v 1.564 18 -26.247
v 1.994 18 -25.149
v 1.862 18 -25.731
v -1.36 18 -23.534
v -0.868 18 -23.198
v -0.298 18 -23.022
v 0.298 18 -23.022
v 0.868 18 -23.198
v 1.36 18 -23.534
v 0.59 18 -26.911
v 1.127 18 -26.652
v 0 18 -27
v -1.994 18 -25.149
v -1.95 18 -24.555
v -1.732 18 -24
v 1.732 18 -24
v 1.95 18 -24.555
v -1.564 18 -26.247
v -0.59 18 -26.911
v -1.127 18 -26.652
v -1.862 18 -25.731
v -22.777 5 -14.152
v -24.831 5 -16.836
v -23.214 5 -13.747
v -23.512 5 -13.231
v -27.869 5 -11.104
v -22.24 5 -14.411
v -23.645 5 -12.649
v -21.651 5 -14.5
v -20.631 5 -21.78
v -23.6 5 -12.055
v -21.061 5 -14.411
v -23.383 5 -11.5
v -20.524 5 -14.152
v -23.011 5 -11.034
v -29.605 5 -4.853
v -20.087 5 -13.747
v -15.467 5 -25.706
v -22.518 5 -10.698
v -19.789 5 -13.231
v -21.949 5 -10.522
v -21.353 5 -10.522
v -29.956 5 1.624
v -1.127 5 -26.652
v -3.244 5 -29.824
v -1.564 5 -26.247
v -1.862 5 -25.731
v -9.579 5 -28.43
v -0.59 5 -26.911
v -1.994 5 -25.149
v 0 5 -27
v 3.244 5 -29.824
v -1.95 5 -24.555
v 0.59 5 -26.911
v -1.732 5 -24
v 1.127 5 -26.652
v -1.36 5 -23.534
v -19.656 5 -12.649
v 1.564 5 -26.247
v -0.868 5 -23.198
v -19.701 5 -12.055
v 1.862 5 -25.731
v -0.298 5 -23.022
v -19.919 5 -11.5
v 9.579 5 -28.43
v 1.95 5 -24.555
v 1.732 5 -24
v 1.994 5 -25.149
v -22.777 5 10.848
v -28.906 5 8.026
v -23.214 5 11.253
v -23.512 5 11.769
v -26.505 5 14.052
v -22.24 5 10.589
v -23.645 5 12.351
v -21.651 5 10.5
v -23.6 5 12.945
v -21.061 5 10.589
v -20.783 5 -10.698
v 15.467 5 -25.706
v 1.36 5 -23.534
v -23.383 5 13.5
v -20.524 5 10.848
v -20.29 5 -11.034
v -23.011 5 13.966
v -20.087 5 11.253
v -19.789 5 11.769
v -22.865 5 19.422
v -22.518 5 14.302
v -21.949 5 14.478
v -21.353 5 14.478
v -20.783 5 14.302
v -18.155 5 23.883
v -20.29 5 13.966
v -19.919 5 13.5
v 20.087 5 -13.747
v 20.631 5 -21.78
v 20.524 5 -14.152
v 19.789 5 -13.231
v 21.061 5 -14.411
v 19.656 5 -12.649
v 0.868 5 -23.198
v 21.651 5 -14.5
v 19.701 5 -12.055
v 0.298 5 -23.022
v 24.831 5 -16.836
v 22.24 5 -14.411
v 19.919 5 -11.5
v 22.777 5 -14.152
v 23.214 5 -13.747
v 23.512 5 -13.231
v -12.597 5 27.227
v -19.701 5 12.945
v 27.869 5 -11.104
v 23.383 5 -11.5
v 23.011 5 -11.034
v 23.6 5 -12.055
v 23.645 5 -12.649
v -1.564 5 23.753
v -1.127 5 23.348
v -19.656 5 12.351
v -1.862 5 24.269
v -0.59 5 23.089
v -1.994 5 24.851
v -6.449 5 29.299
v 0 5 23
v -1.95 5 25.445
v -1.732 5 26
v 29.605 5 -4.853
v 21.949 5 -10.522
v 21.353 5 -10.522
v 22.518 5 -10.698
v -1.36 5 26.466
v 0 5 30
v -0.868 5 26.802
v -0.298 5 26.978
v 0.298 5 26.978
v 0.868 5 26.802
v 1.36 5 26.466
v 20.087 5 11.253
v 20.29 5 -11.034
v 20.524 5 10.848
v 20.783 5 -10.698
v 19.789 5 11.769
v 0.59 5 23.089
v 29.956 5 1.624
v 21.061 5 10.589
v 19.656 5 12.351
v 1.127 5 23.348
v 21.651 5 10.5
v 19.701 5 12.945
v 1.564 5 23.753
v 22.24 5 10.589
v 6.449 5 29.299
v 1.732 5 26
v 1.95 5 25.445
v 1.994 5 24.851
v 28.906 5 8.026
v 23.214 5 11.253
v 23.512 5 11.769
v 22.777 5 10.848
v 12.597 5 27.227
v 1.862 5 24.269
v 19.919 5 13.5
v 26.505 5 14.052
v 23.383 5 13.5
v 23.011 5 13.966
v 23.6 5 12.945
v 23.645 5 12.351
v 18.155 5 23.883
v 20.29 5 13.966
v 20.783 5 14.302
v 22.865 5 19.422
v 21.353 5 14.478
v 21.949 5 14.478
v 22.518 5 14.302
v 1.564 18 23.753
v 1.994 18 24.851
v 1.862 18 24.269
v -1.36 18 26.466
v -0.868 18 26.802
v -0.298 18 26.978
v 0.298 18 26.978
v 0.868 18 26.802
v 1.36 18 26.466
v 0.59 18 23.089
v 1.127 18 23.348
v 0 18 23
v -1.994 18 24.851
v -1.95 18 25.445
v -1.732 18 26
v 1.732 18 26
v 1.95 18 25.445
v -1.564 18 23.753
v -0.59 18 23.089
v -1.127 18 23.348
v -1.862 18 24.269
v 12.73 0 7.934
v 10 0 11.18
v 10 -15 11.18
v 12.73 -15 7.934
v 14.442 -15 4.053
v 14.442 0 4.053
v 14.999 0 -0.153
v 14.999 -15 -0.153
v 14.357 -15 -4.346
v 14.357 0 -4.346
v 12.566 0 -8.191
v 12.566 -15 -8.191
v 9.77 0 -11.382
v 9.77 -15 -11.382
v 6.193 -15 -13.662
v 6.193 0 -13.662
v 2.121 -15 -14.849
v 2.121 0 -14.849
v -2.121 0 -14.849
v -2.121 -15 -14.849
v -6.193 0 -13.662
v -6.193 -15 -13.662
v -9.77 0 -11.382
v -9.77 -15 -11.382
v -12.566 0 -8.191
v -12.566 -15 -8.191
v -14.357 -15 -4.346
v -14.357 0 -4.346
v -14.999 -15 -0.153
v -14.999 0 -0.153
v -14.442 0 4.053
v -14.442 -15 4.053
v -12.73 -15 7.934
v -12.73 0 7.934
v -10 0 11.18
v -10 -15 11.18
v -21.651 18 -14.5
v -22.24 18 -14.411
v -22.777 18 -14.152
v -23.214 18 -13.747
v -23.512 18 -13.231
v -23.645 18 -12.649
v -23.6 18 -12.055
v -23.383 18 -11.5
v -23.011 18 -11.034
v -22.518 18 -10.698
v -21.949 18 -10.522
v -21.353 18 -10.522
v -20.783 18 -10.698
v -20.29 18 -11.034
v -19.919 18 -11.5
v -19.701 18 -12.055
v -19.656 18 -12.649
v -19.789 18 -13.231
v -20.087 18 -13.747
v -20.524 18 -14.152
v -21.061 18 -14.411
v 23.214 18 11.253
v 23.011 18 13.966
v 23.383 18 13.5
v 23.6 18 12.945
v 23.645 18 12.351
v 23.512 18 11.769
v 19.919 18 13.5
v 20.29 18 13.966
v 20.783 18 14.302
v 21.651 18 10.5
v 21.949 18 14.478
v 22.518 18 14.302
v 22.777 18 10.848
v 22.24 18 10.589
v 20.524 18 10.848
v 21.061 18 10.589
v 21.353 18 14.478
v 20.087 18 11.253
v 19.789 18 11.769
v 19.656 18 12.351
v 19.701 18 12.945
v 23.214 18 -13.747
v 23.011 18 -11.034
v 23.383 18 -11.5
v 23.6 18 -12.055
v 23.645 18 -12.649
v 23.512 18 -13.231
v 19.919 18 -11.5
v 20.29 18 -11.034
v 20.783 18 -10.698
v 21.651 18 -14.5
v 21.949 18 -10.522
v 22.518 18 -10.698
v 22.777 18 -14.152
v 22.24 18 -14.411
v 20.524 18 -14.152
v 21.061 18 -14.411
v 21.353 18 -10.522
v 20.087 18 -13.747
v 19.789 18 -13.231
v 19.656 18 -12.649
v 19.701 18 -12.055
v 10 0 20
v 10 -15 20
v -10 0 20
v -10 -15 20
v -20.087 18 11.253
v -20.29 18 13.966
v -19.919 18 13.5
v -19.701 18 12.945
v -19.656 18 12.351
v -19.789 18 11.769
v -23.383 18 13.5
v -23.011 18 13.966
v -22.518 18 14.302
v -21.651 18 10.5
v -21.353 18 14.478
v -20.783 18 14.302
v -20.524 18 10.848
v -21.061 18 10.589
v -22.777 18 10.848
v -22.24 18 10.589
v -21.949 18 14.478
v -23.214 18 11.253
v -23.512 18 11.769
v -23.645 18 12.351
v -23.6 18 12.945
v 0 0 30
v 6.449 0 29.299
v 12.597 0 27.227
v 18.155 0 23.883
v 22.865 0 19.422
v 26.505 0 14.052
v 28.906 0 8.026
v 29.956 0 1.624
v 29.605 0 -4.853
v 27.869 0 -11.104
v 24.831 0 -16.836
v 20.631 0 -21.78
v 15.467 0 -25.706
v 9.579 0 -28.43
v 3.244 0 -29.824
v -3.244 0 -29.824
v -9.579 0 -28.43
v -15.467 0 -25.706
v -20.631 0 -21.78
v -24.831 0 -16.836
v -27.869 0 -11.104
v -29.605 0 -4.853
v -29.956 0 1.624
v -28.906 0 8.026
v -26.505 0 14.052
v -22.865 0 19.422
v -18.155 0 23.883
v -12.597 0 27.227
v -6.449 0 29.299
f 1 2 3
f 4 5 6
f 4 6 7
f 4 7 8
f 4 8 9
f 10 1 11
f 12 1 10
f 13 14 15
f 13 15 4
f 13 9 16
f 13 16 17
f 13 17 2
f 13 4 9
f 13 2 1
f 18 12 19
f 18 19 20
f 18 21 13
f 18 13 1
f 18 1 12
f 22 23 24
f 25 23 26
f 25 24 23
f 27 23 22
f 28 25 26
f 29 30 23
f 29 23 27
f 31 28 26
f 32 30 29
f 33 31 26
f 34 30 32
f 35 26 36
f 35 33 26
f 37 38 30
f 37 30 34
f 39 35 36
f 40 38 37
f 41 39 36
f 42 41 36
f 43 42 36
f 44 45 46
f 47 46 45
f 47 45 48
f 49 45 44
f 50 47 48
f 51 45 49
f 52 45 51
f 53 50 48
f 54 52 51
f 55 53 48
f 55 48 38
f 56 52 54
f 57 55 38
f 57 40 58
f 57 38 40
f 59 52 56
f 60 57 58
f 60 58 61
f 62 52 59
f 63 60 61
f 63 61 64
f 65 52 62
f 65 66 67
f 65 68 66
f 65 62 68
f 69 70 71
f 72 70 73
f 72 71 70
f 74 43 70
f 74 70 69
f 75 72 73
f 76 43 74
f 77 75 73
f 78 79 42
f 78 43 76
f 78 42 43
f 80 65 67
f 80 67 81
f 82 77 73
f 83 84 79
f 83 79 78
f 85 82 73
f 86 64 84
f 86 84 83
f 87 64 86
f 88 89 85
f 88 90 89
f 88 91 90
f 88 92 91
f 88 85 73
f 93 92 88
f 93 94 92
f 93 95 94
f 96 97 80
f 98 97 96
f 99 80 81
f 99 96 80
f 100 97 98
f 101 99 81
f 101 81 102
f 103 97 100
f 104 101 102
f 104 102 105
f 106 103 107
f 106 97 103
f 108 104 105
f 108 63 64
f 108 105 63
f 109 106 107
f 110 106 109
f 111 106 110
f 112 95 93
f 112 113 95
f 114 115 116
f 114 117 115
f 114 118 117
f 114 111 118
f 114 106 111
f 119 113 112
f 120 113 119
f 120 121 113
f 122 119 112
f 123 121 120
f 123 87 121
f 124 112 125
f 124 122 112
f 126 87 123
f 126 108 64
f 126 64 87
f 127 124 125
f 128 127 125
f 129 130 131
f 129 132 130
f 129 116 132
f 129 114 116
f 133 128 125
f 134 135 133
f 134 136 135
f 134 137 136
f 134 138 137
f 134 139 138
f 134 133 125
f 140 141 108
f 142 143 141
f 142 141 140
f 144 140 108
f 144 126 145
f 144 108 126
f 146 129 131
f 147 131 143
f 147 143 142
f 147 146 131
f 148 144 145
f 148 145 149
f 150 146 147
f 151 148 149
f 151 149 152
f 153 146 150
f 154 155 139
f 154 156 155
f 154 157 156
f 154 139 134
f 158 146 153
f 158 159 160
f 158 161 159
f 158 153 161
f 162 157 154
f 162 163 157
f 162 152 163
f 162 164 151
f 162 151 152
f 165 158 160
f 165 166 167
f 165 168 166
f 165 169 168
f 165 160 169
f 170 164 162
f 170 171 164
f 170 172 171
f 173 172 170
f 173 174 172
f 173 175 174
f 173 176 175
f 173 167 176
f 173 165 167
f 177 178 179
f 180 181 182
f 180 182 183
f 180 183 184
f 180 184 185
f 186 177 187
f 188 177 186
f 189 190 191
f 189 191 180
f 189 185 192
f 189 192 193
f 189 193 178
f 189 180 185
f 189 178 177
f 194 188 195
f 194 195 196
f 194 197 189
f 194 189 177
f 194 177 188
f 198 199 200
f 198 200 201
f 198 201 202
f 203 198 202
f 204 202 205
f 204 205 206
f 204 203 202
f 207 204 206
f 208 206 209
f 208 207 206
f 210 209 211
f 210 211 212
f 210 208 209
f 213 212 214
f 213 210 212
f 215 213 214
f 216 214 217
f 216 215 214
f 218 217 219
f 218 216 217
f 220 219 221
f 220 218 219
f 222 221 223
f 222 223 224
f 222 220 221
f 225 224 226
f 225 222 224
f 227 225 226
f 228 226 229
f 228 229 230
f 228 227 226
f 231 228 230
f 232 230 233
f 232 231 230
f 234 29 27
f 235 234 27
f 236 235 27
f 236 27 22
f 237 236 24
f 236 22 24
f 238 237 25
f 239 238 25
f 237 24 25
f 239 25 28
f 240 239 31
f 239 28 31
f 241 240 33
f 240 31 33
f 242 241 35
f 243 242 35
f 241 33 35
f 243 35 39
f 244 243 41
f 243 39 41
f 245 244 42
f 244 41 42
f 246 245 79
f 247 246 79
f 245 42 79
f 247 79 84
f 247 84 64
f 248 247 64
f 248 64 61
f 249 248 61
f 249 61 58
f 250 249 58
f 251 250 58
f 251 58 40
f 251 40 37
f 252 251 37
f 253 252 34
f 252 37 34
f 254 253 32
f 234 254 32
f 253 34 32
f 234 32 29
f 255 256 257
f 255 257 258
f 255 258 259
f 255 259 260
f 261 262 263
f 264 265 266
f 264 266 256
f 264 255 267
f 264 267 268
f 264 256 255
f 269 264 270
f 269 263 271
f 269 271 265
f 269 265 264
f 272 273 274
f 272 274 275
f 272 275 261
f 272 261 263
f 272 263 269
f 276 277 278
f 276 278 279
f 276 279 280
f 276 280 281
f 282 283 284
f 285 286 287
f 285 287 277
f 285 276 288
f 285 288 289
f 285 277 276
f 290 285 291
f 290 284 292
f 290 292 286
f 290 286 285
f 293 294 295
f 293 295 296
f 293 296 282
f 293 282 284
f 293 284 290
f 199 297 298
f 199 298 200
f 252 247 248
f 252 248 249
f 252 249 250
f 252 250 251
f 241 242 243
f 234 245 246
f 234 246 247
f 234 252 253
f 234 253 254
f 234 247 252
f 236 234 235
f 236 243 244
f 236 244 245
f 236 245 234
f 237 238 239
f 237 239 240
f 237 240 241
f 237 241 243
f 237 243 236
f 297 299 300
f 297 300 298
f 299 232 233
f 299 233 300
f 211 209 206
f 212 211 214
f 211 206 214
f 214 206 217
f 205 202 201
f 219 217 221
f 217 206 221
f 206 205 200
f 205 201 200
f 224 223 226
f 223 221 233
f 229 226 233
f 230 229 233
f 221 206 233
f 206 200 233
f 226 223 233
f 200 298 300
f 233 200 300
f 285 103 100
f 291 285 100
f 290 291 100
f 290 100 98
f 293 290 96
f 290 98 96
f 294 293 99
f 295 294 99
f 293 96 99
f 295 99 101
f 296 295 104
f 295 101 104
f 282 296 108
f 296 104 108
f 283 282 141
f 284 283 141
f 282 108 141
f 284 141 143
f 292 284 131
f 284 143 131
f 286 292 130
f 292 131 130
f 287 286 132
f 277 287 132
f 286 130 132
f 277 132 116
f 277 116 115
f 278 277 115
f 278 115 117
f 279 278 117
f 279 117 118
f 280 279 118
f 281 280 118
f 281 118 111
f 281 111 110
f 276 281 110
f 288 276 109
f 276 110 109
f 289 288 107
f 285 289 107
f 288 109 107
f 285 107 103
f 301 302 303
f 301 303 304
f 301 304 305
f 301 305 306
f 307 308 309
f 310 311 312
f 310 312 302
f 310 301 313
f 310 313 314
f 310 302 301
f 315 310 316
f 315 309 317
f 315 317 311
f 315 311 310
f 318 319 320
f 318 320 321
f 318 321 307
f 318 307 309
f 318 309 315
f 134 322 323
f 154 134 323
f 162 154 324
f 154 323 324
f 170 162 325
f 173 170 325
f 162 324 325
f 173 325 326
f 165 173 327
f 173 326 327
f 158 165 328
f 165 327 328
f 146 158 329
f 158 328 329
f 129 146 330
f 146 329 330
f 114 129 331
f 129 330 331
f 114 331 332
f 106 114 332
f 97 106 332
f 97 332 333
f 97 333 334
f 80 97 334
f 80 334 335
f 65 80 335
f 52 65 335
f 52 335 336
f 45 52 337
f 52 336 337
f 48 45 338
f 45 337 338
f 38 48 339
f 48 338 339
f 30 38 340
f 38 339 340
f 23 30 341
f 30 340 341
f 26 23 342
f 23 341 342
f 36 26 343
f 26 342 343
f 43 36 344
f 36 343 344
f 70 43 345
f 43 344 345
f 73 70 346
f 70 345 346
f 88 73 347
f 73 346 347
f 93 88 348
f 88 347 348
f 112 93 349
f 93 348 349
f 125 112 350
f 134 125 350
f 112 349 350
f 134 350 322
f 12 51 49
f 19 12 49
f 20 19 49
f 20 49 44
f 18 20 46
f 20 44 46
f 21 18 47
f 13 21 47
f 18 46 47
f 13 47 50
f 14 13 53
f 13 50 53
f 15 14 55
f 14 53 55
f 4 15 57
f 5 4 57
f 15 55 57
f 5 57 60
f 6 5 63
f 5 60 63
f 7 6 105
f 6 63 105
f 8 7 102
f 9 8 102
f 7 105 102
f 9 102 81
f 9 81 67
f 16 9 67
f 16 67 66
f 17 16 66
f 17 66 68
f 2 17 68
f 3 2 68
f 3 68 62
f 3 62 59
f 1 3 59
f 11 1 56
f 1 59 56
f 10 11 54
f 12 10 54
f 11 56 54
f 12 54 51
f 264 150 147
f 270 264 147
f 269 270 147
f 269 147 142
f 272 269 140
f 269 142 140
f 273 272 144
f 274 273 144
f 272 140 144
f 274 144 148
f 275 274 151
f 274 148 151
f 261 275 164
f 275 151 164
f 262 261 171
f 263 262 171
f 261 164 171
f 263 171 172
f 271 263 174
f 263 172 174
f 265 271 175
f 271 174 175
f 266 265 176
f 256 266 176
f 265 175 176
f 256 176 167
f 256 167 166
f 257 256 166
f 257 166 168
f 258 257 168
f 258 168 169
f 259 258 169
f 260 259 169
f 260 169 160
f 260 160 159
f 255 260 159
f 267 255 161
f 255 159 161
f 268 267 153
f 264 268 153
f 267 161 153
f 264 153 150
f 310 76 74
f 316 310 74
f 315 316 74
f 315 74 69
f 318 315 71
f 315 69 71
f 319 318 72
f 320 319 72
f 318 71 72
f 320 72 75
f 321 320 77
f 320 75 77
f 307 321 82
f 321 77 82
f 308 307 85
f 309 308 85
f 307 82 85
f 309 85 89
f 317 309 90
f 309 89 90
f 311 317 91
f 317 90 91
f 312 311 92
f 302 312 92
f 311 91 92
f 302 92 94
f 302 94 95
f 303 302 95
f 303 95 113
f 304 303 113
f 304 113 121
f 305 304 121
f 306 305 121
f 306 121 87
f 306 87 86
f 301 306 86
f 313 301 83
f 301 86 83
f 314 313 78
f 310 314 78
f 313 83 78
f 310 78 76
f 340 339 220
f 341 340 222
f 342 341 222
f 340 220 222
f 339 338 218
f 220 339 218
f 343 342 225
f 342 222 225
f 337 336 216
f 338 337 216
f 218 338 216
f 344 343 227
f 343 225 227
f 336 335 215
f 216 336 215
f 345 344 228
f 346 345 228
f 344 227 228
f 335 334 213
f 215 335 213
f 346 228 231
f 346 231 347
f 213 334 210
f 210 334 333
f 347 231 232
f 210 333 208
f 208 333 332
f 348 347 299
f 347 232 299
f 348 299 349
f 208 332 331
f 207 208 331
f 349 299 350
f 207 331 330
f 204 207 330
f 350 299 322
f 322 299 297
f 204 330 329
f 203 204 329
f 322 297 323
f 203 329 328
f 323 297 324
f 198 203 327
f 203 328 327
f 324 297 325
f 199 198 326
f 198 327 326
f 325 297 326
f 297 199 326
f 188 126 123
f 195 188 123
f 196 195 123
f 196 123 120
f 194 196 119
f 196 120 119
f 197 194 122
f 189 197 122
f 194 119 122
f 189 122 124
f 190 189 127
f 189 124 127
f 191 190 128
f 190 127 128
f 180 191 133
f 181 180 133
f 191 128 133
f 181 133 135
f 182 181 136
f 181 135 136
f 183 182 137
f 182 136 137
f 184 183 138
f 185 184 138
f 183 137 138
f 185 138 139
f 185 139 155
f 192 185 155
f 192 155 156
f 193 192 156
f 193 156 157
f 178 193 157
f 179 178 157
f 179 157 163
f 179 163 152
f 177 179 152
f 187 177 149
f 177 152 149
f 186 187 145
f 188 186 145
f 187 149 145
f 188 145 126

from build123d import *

# Parameters (mm, degrees)
SKETCH1_R           = 30
BOSS_EXTRUDE1_DEPTH = 5
SKETCH2_R           = 2
BOSS_EXTRUDE2_DEPTH = 13
BOSS_EXTRUDE3_DEPTH = 15


with BuildPart() as part:
    # Sketch1 → Boss-Extrude1 (new body)
    with BuildSketch(Plane(origin=(0, 0, 0), x_dir=(1, 0, 0), z_dir=(0, 1, 0))):
        with Locations(Location((0, 0, 0), (0, 0, 270))):
            Circle(SKETCH1_R)
    extrude(amount=BOSS_EXTRUDE1_DEPTH)

    # Sketch2 → Boss-Extrude2 (add)
    with BuildSketch(Plane(origin=(0, 5, 0), x_dir=(1, 0, 0), z_dir=(0, 1, 0))):
        with Locations(Location((0, 25, 0), (0, 0, 90))):
            Circle(SKETCH2_R)
        with Locations(Location((21.650635095, 12.5, 0), (0, 0, 90))):
            Circle(SKETCH2_R)
        with Locations(Location((21.650635095, -12.5, 0), (0, 0, 90))):
            Circle(SKETCH2_R)
        with Locations(Location((0, -25, 0), (0, 0, 90))):
            Circle(SKETCH2_R)
        with Locations(Location((-21.650635095, -12.5, 0), (0, 0, 90))):
            Circle(SKETCH2_R)
        with Locations(Location((-21.650635095, 12.5, 0), (0, 0, 90))):
            Circle(SKETCH2_R)
    extrude(amount=BOSS_EXTRUDE2_DEPTH)

    # Sketch3 → Boss-Extrude3 (add)
    with BuildSketch(Plane.XZ):
        with BuildLine():
            Line((-10, 20), (10, 20))
            Line((10, 20), (10, 11.180339887))
            ThreePointArc((10, 11.180339887), (0, -15), (-10, 11.180339887))
            Line((-10, 11.180339887), (-10, 20))
        make_face()
    extrude(amount=BOSS_EXTRUDE3_DEPTH)


solid = part.part
